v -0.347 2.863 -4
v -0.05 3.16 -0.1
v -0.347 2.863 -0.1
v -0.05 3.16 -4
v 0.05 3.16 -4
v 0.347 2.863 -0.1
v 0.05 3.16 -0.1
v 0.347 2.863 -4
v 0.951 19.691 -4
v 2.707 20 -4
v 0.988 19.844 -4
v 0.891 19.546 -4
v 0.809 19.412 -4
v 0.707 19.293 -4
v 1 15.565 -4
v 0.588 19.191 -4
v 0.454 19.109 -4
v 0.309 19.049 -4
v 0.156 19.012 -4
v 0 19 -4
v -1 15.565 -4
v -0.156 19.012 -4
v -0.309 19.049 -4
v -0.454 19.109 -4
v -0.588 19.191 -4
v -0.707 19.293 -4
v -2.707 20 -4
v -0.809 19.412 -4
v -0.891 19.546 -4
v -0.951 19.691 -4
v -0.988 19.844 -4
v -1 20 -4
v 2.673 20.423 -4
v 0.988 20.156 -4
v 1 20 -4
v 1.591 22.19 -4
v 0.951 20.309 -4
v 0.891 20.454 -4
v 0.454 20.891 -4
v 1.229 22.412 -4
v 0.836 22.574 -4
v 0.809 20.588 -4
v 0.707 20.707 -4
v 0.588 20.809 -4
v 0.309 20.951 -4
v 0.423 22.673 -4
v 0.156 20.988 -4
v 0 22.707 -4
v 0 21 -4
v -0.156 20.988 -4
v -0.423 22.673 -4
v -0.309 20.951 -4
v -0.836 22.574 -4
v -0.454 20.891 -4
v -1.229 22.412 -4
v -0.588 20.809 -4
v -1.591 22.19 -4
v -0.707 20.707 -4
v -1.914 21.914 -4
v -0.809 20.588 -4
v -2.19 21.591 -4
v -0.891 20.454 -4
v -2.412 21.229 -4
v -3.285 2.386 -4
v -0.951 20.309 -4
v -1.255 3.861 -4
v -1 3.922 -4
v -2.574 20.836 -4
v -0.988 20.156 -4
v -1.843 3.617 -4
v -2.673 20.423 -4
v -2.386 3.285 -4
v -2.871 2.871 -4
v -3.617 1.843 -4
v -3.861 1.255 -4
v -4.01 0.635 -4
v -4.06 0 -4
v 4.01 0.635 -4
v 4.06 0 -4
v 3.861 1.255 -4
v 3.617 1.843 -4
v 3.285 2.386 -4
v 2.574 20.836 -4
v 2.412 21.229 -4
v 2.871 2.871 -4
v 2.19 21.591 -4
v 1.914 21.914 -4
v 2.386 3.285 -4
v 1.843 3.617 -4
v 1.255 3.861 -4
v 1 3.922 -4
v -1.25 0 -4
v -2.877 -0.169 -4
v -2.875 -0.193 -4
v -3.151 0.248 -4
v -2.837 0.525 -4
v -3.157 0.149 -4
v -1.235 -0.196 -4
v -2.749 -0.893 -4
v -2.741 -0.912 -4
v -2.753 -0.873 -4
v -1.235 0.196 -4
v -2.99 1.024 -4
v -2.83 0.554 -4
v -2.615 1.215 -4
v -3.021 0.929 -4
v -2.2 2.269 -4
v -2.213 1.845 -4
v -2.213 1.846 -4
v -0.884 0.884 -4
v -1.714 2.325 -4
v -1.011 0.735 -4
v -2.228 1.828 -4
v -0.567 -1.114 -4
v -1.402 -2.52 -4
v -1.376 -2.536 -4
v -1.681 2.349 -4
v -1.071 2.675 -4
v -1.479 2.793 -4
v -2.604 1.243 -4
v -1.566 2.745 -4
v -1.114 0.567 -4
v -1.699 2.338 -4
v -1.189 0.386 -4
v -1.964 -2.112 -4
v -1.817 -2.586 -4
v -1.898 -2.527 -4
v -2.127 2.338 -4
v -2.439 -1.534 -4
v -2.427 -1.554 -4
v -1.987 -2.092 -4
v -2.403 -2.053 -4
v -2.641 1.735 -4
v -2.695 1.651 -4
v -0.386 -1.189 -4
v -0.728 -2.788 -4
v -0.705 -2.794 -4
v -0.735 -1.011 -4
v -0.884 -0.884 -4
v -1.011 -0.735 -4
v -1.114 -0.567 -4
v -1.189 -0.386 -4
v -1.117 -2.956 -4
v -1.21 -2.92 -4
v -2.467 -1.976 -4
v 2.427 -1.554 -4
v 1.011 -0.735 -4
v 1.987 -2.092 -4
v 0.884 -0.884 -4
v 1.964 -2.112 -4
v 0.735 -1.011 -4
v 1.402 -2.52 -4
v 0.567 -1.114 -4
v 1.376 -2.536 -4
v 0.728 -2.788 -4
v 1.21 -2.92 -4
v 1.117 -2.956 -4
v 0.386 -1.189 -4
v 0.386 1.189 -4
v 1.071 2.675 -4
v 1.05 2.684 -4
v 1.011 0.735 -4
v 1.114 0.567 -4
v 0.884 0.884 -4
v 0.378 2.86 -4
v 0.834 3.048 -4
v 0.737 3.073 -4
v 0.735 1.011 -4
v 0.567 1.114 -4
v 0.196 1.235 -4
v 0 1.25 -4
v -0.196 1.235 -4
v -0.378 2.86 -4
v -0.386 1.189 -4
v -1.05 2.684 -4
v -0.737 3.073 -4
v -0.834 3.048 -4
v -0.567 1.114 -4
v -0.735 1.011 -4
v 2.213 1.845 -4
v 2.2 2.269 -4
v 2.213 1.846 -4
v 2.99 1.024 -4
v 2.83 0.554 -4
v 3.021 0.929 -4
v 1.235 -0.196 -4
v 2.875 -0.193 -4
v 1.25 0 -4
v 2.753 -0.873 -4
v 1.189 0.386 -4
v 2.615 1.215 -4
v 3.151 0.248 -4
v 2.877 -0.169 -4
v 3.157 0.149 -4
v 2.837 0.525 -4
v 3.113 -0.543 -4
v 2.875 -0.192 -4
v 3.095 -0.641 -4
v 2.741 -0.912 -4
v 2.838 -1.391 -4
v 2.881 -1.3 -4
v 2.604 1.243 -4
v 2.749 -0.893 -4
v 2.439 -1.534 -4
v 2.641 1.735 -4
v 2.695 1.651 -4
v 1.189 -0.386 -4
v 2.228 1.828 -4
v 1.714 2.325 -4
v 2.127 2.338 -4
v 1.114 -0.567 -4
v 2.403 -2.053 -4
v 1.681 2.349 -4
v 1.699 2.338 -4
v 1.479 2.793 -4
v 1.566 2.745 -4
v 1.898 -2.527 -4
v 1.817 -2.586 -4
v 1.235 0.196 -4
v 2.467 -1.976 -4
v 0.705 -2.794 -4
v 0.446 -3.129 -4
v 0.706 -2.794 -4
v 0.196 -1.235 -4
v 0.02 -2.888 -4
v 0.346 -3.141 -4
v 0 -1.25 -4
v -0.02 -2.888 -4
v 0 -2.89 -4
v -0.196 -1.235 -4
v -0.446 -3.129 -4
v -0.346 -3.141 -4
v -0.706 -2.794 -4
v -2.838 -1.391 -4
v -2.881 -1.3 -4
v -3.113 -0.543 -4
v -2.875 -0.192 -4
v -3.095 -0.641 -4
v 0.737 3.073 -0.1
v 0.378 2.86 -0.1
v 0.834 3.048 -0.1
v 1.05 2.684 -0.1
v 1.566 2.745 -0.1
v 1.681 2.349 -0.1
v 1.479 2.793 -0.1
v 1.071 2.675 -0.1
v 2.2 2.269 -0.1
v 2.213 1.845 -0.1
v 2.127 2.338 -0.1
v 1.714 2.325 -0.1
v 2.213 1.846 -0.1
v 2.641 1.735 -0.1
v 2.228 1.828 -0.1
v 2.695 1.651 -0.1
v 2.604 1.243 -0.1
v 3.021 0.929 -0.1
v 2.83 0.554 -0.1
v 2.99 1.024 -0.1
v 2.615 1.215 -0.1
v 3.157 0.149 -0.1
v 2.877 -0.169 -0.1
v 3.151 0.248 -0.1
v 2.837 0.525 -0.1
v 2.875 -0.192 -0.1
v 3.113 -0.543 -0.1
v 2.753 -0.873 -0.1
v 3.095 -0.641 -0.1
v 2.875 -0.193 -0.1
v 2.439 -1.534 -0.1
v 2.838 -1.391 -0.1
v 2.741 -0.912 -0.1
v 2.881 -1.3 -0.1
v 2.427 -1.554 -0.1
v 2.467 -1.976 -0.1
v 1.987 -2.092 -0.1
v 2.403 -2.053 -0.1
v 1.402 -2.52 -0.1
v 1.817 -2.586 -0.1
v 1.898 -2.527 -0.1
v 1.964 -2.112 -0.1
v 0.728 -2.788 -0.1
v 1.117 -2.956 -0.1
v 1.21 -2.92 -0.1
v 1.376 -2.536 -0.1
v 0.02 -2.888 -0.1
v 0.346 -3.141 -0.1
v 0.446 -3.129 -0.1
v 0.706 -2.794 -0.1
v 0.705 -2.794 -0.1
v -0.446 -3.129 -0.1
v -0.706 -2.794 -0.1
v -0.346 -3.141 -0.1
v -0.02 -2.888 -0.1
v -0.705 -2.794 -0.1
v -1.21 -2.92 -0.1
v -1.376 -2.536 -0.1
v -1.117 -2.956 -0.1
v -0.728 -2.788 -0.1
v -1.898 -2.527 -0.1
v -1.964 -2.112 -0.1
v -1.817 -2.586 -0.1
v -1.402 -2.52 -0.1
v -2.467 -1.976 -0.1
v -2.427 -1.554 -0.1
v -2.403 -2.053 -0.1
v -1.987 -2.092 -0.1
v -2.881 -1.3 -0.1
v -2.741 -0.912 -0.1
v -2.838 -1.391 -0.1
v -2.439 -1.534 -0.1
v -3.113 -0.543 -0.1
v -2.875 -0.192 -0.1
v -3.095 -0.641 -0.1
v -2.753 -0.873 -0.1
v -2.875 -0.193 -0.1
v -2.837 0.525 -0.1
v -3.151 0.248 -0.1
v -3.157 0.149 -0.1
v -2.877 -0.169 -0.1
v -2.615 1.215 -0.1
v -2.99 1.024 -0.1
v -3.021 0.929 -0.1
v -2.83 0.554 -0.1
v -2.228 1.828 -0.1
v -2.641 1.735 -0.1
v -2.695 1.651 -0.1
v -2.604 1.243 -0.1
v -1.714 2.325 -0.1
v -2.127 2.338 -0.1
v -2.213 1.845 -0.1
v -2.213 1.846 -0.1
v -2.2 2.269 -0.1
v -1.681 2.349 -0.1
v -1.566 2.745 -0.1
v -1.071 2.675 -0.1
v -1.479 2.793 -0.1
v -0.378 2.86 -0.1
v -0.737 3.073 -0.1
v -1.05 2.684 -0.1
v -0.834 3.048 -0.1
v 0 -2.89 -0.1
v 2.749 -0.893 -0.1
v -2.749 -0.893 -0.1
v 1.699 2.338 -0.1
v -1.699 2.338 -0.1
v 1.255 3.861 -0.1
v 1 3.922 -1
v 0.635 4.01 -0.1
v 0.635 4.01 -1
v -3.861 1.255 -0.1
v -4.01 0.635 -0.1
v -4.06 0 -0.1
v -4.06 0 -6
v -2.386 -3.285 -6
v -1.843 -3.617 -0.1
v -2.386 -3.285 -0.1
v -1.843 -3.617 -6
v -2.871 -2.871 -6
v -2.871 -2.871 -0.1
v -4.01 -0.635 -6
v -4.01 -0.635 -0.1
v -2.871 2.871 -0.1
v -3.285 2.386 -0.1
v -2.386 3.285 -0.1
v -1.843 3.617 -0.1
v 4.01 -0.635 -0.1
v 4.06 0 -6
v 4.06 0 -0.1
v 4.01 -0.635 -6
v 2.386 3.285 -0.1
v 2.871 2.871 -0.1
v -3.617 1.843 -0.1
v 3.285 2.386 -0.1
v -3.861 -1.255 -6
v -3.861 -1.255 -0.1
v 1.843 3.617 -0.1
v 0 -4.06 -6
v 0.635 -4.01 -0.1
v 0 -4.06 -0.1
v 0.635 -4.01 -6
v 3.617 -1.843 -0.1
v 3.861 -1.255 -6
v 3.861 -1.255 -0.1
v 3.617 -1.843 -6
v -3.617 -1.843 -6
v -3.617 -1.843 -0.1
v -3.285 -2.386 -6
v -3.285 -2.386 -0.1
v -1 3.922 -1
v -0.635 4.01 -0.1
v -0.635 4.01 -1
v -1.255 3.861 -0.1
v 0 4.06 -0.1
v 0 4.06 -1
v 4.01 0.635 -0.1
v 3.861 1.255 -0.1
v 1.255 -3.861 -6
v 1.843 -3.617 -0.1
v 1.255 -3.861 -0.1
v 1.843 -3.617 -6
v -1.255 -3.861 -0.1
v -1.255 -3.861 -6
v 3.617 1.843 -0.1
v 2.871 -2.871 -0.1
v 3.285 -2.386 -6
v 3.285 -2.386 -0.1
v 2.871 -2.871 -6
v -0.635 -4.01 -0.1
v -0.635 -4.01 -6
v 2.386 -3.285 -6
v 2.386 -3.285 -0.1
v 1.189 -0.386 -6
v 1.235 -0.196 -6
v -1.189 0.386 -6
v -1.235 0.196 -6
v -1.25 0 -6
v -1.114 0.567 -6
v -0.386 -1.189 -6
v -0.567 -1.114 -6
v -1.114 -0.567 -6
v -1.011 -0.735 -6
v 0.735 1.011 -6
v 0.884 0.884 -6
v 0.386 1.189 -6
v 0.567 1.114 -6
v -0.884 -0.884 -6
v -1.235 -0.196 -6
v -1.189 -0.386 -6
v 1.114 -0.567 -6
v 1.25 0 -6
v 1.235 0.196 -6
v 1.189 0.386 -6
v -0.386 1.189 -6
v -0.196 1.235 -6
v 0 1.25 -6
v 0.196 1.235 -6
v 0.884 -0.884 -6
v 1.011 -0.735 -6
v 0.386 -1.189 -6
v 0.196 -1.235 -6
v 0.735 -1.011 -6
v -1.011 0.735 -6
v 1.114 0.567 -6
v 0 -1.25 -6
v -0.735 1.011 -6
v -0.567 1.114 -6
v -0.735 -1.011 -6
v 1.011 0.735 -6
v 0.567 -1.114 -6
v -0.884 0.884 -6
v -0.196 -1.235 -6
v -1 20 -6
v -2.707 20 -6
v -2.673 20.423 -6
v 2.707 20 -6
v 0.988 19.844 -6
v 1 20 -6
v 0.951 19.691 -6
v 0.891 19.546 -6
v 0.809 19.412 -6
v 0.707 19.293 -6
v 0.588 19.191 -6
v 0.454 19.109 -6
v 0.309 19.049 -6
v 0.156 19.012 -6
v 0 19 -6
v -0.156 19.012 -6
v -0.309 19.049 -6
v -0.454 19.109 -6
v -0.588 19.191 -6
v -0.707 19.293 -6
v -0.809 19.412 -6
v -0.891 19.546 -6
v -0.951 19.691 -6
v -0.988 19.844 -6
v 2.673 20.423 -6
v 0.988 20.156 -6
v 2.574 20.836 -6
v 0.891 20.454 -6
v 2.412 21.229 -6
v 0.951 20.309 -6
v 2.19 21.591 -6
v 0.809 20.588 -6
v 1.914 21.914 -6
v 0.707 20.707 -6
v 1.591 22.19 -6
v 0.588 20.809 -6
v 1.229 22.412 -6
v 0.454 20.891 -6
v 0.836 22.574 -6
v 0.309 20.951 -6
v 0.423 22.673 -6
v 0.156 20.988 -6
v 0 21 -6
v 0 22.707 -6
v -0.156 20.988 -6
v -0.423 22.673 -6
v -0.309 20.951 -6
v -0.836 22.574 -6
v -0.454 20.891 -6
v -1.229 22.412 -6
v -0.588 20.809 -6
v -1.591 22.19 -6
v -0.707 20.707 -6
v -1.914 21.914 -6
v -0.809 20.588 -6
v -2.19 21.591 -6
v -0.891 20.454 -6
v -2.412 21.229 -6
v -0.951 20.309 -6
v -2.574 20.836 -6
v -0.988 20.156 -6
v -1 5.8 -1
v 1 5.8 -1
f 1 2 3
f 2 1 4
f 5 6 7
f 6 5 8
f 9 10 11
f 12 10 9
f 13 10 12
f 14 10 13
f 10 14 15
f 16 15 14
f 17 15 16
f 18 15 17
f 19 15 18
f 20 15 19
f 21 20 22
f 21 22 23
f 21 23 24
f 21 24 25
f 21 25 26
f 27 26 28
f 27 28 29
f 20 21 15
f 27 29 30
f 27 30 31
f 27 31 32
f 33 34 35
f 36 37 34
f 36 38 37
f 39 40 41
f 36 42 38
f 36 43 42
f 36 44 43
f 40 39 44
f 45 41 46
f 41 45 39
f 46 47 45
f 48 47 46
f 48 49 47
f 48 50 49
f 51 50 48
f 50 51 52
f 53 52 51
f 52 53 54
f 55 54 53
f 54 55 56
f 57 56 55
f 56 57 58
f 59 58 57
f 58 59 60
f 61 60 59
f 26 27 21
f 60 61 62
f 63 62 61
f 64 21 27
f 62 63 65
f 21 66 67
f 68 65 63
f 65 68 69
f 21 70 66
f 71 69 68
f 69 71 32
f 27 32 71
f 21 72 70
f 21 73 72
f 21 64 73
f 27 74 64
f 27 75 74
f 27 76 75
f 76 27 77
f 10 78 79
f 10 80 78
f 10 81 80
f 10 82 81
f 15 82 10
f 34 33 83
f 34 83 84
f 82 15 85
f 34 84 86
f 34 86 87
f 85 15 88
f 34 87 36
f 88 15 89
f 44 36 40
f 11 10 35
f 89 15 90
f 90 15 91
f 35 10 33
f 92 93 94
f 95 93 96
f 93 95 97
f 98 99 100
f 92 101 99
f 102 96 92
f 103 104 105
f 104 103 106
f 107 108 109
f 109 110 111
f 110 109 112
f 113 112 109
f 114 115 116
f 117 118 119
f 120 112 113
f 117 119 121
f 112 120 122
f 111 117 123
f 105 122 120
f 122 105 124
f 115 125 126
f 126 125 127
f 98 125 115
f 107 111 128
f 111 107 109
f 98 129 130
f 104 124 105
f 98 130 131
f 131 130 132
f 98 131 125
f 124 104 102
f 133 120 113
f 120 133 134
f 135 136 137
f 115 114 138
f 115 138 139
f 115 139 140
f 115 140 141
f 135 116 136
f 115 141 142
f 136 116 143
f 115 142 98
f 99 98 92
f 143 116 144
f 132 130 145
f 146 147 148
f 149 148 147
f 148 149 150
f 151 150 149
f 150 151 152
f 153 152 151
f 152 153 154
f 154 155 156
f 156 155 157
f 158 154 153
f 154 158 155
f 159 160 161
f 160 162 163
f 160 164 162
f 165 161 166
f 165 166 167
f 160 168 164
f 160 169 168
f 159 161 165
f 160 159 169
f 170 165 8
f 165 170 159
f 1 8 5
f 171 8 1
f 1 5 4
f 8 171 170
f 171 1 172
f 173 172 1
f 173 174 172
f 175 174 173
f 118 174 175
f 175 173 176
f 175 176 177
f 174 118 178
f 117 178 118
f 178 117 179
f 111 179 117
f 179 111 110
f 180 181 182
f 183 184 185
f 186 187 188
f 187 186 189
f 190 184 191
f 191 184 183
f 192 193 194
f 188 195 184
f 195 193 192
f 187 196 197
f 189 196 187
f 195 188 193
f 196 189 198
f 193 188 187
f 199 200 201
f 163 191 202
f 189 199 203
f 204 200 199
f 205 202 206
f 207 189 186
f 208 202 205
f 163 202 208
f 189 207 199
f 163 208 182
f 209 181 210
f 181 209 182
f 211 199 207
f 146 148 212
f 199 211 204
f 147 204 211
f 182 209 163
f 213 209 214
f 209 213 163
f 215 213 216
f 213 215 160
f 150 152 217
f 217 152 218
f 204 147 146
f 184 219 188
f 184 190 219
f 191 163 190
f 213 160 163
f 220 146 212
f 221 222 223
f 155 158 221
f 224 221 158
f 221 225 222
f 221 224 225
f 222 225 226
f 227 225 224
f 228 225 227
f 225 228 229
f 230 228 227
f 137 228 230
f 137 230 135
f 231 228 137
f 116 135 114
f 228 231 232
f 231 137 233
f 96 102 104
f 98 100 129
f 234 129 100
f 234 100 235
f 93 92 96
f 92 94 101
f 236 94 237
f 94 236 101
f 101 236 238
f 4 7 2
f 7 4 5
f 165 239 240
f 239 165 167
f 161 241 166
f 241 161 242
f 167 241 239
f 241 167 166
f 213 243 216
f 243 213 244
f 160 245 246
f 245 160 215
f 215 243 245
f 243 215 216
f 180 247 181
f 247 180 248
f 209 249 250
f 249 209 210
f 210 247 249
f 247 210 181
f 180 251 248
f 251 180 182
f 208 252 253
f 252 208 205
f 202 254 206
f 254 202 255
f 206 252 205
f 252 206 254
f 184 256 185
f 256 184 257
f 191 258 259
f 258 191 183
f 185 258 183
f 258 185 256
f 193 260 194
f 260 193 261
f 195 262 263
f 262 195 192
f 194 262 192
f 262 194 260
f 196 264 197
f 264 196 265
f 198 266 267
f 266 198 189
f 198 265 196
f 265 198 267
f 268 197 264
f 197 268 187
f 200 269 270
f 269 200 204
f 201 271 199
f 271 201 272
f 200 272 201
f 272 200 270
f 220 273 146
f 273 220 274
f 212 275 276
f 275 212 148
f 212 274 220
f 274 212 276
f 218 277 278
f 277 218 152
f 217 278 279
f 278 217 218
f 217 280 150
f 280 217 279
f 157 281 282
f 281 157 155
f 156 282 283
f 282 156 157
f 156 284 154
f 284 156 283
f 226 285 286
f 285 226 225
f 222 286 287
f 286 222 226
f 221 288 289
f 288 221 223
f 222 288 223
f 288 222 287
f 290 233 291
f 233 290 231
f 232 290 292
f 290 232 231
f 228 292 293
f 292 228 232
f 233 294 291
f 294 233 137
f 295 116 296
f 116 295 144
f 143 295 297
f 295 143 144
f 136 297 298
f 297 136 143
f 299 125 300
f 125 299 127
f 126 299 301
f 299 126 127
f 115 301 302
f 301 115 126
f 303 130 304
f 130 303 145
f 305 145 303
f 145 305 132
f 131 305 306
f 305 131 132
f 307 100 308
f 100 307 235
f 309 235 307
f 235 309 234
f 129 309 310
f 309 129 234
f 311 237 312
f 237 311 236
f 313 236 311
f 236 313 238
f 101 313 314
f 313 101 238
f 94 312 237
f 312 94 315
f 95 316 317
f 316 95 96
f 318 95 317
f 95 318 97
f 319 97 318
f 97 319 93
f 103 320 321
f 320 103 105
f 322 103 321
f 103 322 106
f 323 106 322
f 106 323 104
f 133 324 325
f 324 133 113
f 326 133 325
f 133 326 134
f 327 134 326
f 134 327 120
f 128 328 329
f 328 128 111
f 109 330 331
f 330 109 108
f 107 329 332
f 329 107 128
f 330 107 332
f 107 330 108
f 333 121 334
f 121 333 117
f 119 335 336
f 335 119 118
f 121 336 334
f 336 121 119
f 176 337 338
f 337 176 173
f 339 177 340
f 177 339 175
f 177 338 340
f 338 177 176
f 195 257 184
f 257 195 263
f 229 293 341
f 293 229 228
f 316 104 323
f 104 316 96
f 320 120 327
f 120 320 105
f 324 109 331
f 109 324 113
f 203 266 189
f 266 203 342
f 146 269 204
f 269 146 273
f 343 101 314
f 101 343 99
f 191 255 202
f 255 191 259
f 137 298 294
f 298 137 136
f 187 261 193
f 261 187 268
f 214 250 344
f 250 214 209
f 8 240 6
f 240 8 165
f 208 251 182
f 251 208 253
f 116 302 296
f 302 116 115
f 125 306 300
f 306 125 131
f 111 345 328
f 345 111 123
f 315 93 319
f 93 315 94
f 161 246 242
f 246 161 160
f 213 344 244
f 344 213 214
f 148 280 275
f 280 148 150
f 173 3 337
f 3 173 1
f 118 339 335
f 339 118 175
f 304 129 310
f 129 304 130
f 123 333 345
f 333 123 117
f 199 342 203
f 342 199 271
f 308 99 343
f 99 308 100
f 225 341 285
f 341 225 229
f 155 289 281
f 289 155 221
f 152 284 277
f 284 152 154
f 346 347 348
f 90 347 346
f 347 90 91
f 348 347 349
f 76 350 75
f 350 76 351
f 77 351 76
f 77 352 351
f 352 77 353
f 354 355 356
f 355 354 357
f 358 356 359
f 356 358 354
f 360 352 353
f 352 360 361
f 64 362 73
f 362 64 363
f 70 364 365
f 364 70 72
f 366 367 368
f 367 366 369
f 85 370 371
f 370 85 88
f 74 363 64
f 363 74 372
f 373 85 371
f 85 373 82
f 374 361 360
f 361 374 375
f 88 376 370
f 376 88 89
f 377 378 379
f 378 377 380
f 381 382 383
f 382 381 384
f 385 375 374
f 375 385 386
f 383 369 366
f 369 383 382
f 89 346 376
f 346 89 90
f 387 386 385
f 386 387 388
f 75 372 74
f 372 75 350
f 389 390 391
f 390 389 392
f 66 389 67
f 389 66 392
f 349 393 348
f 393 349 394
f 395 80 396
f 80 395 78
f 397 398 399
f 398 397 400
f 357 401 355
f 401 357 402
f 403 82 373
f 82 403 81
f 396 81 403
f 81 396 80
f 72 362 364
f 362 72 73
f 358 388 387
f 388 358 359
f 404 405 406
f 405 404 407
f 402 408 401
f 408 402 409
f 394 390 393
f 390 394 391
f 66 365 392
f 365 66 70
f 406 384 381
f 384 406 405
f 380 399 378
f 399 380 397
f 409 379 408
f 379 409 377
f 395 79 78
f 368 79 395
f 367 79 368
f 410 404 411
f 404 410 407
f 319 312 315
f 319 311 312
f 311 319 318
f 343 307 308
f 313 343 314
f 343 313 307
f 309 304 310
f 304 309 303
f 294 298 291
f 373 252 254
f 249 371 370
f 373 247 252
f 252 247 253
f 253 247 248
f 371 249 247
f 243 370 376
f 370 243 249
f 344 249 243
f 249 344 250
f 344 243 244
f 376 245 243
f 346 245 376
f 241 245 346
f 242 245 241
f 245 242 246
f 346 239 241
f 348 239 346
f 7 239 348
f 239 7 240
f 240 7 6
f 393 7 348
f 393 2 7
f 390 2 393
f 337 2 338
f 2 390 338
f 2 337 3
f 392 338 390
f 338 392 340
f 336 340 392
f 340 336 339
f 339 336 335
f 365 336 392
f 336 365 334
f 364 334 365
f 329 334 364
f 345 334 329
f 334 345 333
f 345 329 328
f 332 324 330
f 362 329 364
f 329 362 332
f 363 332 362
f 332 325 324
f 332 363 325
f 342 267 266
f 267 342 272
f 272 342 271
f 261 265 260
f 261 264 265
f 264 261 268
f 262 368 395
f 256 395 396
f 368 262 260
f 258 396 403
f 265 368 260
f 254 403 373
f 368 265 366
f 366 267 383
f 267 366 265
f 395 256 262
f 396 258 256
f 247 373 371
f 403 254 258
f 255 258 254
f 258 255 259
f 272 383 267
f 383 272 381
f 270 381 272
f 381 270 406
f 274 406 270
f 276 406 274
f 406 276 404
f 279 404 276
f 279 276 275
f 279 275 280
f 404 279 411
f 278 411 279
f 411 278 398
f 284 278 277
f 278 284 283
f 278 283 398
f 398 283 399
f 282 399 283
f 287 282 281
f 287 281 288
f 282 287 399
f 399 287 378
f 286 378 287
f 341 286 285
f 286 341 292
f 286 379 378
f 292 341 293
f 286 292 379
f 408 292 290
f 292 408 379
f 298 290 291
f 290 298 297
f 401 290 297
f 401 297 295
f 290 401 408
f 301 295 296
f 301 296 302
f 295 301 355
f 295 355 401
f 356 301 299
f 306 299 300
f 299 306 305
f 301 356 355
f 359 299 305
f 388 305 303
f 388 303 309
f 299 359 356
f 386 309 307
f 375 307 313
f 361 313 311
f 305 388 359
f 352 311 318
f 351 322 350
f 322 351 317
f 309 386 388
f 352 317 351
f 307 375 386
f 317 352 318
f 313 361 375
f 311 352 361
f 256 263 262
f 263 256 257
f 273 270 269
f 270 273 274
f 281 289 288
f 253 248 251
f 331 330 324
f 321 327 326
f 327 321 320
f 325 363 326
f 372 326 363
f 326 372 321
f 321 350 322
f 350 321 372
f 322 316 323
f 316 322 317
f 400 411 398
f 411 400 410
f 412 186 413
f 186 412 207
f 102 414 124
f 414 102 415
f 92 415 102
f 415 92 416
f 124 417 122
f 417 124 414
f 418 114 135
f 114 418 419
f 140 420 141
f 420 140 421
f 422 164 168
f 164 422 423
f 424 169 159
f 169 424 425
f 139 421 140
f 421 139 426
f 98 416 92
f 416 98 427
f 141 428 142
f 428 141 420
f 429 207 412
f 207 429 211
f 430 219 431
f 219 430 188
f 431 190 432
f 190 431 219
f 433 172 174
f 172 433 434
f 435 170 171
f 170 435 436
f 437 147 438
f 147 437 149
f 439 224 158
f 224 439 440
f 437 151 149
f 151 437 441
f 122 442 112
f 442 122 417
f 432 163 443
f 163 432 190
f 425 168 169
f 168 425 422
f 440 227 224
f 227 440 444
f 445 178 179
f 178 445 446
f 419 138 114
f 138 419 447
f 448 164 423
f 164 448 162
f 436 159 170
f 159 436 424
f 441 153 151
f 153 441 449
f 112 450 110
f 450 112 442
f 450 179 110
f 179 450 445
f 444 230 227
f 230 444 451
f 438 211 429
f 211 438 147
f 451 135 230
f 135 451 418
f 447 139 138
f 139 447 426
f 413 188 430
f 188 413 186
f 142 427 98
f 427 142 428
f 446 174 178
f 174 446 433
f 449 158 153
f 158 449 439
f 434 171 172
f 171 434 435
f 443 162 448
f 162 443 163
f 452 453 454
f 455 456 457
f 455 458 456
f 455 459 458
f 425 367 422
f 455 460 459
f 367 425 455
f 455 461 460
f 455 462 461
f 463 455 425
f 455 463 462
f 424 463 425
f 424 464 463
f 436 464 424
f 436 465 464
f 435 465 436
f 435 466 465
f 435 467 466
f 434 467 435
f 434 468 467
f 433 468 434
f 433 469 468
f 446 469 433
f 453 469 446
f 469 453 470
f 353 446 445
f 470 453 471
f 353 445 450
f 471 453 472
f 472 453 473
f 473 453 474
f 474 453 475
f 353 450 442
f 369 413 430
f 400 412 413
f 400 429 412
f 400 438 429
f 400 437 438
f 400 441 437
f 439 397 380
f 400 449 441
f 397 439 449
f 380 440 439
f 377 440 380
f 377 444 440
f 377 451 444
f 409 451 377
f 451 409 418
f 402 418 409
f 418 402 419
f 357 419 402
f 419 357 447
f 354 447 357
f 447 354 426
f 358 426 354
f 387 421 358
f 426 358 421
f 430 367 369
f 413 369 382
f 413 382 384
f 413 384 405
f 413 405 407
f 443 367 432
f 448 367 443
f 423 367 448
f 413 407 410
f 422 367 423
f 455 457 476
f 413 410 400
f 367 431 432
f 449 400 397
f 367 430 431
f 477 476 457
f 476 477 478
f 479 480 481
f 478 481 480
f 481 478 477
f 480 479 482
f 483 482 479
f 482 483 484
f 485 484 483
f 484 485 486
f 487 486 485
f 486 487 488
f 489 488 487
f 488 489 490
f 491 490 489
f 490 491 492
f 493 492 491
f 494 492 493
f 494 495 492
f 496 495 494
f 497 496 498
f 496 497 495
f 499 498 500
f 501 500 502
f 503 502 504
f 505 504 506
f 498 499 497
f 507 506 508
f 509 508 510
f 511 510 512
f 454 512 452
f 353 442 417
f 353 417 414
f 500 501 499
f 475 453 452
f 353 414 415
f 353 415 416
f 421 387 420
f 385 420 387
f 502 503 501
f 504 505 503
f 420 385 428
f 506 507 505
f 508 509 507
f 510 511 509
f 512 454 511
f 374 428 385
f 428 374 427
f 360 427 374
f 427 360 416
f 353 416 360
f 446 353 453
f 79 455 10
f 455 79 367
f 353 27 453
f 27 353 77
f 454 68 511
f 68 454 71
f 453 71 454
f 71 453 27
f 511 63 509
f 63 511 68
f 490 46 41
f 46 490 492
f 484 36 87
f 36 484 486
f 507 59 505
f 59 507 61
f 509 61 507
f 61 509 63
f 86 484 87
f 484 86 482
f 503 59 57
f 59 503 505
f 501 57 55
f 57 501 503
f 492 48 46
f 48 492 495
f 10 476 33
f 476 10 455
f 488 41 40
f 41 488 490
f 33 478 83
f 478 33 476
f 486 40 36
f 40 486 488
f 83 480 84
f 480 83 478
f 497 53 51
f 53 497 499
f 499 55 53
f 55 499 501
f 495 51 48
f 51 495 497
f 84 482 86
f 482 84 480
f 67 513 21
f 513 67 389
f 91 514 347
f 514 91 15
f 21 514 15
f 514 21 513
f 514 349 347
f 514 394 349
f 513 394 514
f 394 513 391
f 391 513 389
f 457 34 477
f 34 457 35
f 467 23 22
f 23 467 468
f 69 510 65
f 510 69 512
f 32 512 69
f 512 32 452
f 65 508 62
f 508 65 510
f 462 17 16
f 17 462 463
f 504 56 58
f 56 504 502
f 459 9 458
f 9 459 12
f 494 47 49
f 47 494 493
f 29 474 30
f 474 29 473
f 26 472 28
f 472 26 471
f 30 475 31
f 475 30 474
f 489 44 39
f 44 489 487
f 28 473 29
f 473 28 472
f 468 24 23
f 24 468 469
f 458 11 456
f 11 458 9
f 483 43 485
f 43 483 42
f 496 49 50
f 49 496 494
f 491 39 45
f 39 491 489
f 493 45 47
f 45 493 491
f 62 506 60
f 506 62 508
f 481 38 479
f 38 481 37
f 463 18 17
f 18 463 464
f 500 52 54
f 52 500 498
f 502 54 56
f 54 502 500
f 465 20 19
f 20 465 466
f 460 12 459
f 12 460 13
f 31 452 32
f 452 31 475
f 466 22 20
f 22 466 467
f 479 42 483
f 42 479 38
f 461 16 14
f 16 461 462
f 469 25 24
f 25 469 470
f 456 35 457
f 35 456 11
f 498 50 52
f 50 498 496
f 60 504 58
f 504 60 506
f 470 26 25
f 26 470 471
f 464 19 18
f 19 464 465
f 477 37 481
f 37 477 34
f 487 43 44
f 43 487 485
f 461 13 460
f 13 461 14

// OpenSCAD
/**
 *  Parametric servo arm generator for OpenScad
 *  Générateur de palonnier de servo pour OpenScad
 *
 *  Copyright (c) 2012 Charles Rincheval.  All rights reserved.
 *
 *  This library is free software; you can redistribute it and/or
 *  modify it under the terms of the GNU Lesser General Public
 *  License as published by the Free Software Foundation; either
 *  version 2.1 of the License, or (at your option) any later version.
 *
 *  This library is distributed in the hope that it will be useful,
 *  but WITHOUT ANY WARRANTY; without even the implied warranty of
 *  MERCHANTABILITY or FITNESS FOR A PARTICULAR PURPOSE.  See the GNU
 *  Lesser General Public License for more details.
 *
 *  You should have received a copy of the GNU Lesser General Public
 *  License along with this library; if not, write to the Free Software
 *  Foundation, Inc., 51 Franklin St, Fifth Floor, Boston, MA  02110-1301  USA
 *
 *  Last update :
 *  https://github.com/hugokernel/OpenSCAD_ServoArms
 *
 *  http://www.digitalspirit.org/
 */

arm_length = 20;

arm_count = 1; // [1,2,3,4,5,6,7,8]

//  Clear between arm head and servo head (PLA: 0.3, ABS 0.2)
SERVO_HEAD_CLEAR = 0.2; // [0.2,0.3,0.4,0.5]

$fn = 40 / 1;

/**
 *  Head / Tooth parameters
 *  Futaba 3F Standard Spline
 *  http://www.servocity.com/html/futaba_servo_splines.html
 *
 *  First array (head related) :
 *  0. Head external diameter
 *  1. Head heigth
 *  2. Head thickness
 *  3. Head screw diameter
 *
 *  Second array (tooth related) :
 *  0. Tooth count
 *  1. Tooth height
 *  2. Tooth length
 *  3. Tooth width
 */
FUTABA_3F_SPLINE = [
                       [5.92, 4, 1.1, 2.5],
                       [25, 0.3, 0.7, 0.1]
                   ];

module servo_futaba_3f(length, count) {
    servo_arm(FUTABA_3F_SPLINE, [length, count]);
}

/**
 *  If you want to support a new servo, juste add a new spline definition array
 *  and a module named like servo_XXX_YYY where XXX is servo brand and YYY is the
 *  connection type (3f) or the servo type (s3003)
 */

module servo_standard(length, count) {
    servo_futaba_3f(length, count);
}

/**
 *  Tooth
 *
 *    |<-w->|
 *    |_____|___
 *    /     \  ^h
 *  _/       \_v
 *   |<--l-->|
 *
 *  - tooth length (l)
 *  - tooth width (w)
 *  - tooth height (h)
 *  - height
 *
 */
module servo_head_tooth(length, width, height, head_height) {
    linear_extrude(height = head_height) {
        polygon([[-length / 2, 0], [-width / 2, height], [width / 2, height], [length / 2,0]]);
    }
}

/**
 *  Servo head
 */
module servo_head(params, clear = SERVO_HEAD_CLEAR) {

    head = params[0];
    tooth = params[1];

    head_diameter = head[0];
    head_heigth = head[1];

    tooth_count = tooth[0];
    tooth_height = tooth[1];
    tooth_length = tooth[2];
    tooth_width = tooth[3];

    % cylinder(r = head_diameter / 2, h = head_heigth + 1);

    cylinder(r = head_diameter / 2 - tooth_height + 0.03 + clear, h = head_heigth);

    for (i = [0 : tooth_count]) {
        rotate([0, 0, i * (360 / tooth_count)]) {
            translate([0, head_diameter / 2 - tooth_height + clear, 0]) {
                servo_head_tooth(tooth_length, tooth_width, tooth_height, head_heigth);
            }
        }
    }
}

/**
 *  Servo hold
 *  - Head / Tooth parameters
 *  - Arms params (length and count)
 */
module servo_arm(params, arms) {

    head = params[0];
    tooth = params[1];

    head_diameter = head[0];
    head_heigth = head[1];
    head_thickness = head[2];
    head_screw_diameter = head[3];

    tooth_length = tooth[2];
    tooth_width = tooth[3];

    arm_length = arms[0];
    arm_count = arms[1];

    /**
     *  Servo arm
     *  - length is from center to last hole
     */
    module arm(tooth_length, tooth_width, head_height, head_heigth, hole_count = 1) {

        arm_screw_diameter = 2;

        difference() {
            union() {
                cylinder(r = tooth_width / 2, h = head_heigth);

                linear_extrude(height = head_heigth) {
                    polygon([
                                [-tooth_width / 2, 0], [-tooth_width / 3, tooth_length],
                                [tooth_width / 3, tooth_length], [tooth_width / 2, 0]
                            ]);
                }

                translate([0, tooth_length, 0]) {
                    cylinder(r = tooth_width / 3, h = head_heigth);
                }

                if (tooth_length >= 12) {
                    translate([-head_heigth / 2 + 2, 3.8, -4]) {
                        rotate([90, 0, 0]) {
                            rotate([0, -90, 0]) {
                                linear_extrude(height = head_heigth) {
                                    polygon([
                                                [-tooth_length / 1.7, 4], [0, 4], [0, - head_height + 5],
                                                [-2, - head_height + 5]
                                            ]);
                                }
                            }
                        }
                    }
                }
            }

            // Hole
            for (i = [0 : hole_count - 1]) {
                //translate([0, length - (length / hole_count * i), -1]) {
                translate([0, tooth_length - (4 * i), -1]) {
                    cylinder(r = arm_screw_diameter / 2, h = 10);
                }
            }

            cylinder(r = head_screw_diameter / 2, h = 10);
        }
    }

    difference() {
        translate([0, 0, 0.1]) {
            cylinder(r = head_diameter / 2 + head_thickness, h = head_heigth + 1);
        }

        cylinder(r = head_screw_diameter / 2, h = 10);

        servo_head(params);
    }

    arm_thickness = head_thickness;

    // Arm
    translate([0, 0, head_heigth]) {
        for (i = [0 : arm_count - 1]) {
            rotate([0, 0, i * (360 / arm_count)]) {
                arm(arm_length, head_diameter + arm_thickness * 2, head_heigth, 2);
            }
        }
    }
}

module demo() {
    rotate([0, 180, 0])
    servo_standard(arm_length, arm_count);
}

demo();
